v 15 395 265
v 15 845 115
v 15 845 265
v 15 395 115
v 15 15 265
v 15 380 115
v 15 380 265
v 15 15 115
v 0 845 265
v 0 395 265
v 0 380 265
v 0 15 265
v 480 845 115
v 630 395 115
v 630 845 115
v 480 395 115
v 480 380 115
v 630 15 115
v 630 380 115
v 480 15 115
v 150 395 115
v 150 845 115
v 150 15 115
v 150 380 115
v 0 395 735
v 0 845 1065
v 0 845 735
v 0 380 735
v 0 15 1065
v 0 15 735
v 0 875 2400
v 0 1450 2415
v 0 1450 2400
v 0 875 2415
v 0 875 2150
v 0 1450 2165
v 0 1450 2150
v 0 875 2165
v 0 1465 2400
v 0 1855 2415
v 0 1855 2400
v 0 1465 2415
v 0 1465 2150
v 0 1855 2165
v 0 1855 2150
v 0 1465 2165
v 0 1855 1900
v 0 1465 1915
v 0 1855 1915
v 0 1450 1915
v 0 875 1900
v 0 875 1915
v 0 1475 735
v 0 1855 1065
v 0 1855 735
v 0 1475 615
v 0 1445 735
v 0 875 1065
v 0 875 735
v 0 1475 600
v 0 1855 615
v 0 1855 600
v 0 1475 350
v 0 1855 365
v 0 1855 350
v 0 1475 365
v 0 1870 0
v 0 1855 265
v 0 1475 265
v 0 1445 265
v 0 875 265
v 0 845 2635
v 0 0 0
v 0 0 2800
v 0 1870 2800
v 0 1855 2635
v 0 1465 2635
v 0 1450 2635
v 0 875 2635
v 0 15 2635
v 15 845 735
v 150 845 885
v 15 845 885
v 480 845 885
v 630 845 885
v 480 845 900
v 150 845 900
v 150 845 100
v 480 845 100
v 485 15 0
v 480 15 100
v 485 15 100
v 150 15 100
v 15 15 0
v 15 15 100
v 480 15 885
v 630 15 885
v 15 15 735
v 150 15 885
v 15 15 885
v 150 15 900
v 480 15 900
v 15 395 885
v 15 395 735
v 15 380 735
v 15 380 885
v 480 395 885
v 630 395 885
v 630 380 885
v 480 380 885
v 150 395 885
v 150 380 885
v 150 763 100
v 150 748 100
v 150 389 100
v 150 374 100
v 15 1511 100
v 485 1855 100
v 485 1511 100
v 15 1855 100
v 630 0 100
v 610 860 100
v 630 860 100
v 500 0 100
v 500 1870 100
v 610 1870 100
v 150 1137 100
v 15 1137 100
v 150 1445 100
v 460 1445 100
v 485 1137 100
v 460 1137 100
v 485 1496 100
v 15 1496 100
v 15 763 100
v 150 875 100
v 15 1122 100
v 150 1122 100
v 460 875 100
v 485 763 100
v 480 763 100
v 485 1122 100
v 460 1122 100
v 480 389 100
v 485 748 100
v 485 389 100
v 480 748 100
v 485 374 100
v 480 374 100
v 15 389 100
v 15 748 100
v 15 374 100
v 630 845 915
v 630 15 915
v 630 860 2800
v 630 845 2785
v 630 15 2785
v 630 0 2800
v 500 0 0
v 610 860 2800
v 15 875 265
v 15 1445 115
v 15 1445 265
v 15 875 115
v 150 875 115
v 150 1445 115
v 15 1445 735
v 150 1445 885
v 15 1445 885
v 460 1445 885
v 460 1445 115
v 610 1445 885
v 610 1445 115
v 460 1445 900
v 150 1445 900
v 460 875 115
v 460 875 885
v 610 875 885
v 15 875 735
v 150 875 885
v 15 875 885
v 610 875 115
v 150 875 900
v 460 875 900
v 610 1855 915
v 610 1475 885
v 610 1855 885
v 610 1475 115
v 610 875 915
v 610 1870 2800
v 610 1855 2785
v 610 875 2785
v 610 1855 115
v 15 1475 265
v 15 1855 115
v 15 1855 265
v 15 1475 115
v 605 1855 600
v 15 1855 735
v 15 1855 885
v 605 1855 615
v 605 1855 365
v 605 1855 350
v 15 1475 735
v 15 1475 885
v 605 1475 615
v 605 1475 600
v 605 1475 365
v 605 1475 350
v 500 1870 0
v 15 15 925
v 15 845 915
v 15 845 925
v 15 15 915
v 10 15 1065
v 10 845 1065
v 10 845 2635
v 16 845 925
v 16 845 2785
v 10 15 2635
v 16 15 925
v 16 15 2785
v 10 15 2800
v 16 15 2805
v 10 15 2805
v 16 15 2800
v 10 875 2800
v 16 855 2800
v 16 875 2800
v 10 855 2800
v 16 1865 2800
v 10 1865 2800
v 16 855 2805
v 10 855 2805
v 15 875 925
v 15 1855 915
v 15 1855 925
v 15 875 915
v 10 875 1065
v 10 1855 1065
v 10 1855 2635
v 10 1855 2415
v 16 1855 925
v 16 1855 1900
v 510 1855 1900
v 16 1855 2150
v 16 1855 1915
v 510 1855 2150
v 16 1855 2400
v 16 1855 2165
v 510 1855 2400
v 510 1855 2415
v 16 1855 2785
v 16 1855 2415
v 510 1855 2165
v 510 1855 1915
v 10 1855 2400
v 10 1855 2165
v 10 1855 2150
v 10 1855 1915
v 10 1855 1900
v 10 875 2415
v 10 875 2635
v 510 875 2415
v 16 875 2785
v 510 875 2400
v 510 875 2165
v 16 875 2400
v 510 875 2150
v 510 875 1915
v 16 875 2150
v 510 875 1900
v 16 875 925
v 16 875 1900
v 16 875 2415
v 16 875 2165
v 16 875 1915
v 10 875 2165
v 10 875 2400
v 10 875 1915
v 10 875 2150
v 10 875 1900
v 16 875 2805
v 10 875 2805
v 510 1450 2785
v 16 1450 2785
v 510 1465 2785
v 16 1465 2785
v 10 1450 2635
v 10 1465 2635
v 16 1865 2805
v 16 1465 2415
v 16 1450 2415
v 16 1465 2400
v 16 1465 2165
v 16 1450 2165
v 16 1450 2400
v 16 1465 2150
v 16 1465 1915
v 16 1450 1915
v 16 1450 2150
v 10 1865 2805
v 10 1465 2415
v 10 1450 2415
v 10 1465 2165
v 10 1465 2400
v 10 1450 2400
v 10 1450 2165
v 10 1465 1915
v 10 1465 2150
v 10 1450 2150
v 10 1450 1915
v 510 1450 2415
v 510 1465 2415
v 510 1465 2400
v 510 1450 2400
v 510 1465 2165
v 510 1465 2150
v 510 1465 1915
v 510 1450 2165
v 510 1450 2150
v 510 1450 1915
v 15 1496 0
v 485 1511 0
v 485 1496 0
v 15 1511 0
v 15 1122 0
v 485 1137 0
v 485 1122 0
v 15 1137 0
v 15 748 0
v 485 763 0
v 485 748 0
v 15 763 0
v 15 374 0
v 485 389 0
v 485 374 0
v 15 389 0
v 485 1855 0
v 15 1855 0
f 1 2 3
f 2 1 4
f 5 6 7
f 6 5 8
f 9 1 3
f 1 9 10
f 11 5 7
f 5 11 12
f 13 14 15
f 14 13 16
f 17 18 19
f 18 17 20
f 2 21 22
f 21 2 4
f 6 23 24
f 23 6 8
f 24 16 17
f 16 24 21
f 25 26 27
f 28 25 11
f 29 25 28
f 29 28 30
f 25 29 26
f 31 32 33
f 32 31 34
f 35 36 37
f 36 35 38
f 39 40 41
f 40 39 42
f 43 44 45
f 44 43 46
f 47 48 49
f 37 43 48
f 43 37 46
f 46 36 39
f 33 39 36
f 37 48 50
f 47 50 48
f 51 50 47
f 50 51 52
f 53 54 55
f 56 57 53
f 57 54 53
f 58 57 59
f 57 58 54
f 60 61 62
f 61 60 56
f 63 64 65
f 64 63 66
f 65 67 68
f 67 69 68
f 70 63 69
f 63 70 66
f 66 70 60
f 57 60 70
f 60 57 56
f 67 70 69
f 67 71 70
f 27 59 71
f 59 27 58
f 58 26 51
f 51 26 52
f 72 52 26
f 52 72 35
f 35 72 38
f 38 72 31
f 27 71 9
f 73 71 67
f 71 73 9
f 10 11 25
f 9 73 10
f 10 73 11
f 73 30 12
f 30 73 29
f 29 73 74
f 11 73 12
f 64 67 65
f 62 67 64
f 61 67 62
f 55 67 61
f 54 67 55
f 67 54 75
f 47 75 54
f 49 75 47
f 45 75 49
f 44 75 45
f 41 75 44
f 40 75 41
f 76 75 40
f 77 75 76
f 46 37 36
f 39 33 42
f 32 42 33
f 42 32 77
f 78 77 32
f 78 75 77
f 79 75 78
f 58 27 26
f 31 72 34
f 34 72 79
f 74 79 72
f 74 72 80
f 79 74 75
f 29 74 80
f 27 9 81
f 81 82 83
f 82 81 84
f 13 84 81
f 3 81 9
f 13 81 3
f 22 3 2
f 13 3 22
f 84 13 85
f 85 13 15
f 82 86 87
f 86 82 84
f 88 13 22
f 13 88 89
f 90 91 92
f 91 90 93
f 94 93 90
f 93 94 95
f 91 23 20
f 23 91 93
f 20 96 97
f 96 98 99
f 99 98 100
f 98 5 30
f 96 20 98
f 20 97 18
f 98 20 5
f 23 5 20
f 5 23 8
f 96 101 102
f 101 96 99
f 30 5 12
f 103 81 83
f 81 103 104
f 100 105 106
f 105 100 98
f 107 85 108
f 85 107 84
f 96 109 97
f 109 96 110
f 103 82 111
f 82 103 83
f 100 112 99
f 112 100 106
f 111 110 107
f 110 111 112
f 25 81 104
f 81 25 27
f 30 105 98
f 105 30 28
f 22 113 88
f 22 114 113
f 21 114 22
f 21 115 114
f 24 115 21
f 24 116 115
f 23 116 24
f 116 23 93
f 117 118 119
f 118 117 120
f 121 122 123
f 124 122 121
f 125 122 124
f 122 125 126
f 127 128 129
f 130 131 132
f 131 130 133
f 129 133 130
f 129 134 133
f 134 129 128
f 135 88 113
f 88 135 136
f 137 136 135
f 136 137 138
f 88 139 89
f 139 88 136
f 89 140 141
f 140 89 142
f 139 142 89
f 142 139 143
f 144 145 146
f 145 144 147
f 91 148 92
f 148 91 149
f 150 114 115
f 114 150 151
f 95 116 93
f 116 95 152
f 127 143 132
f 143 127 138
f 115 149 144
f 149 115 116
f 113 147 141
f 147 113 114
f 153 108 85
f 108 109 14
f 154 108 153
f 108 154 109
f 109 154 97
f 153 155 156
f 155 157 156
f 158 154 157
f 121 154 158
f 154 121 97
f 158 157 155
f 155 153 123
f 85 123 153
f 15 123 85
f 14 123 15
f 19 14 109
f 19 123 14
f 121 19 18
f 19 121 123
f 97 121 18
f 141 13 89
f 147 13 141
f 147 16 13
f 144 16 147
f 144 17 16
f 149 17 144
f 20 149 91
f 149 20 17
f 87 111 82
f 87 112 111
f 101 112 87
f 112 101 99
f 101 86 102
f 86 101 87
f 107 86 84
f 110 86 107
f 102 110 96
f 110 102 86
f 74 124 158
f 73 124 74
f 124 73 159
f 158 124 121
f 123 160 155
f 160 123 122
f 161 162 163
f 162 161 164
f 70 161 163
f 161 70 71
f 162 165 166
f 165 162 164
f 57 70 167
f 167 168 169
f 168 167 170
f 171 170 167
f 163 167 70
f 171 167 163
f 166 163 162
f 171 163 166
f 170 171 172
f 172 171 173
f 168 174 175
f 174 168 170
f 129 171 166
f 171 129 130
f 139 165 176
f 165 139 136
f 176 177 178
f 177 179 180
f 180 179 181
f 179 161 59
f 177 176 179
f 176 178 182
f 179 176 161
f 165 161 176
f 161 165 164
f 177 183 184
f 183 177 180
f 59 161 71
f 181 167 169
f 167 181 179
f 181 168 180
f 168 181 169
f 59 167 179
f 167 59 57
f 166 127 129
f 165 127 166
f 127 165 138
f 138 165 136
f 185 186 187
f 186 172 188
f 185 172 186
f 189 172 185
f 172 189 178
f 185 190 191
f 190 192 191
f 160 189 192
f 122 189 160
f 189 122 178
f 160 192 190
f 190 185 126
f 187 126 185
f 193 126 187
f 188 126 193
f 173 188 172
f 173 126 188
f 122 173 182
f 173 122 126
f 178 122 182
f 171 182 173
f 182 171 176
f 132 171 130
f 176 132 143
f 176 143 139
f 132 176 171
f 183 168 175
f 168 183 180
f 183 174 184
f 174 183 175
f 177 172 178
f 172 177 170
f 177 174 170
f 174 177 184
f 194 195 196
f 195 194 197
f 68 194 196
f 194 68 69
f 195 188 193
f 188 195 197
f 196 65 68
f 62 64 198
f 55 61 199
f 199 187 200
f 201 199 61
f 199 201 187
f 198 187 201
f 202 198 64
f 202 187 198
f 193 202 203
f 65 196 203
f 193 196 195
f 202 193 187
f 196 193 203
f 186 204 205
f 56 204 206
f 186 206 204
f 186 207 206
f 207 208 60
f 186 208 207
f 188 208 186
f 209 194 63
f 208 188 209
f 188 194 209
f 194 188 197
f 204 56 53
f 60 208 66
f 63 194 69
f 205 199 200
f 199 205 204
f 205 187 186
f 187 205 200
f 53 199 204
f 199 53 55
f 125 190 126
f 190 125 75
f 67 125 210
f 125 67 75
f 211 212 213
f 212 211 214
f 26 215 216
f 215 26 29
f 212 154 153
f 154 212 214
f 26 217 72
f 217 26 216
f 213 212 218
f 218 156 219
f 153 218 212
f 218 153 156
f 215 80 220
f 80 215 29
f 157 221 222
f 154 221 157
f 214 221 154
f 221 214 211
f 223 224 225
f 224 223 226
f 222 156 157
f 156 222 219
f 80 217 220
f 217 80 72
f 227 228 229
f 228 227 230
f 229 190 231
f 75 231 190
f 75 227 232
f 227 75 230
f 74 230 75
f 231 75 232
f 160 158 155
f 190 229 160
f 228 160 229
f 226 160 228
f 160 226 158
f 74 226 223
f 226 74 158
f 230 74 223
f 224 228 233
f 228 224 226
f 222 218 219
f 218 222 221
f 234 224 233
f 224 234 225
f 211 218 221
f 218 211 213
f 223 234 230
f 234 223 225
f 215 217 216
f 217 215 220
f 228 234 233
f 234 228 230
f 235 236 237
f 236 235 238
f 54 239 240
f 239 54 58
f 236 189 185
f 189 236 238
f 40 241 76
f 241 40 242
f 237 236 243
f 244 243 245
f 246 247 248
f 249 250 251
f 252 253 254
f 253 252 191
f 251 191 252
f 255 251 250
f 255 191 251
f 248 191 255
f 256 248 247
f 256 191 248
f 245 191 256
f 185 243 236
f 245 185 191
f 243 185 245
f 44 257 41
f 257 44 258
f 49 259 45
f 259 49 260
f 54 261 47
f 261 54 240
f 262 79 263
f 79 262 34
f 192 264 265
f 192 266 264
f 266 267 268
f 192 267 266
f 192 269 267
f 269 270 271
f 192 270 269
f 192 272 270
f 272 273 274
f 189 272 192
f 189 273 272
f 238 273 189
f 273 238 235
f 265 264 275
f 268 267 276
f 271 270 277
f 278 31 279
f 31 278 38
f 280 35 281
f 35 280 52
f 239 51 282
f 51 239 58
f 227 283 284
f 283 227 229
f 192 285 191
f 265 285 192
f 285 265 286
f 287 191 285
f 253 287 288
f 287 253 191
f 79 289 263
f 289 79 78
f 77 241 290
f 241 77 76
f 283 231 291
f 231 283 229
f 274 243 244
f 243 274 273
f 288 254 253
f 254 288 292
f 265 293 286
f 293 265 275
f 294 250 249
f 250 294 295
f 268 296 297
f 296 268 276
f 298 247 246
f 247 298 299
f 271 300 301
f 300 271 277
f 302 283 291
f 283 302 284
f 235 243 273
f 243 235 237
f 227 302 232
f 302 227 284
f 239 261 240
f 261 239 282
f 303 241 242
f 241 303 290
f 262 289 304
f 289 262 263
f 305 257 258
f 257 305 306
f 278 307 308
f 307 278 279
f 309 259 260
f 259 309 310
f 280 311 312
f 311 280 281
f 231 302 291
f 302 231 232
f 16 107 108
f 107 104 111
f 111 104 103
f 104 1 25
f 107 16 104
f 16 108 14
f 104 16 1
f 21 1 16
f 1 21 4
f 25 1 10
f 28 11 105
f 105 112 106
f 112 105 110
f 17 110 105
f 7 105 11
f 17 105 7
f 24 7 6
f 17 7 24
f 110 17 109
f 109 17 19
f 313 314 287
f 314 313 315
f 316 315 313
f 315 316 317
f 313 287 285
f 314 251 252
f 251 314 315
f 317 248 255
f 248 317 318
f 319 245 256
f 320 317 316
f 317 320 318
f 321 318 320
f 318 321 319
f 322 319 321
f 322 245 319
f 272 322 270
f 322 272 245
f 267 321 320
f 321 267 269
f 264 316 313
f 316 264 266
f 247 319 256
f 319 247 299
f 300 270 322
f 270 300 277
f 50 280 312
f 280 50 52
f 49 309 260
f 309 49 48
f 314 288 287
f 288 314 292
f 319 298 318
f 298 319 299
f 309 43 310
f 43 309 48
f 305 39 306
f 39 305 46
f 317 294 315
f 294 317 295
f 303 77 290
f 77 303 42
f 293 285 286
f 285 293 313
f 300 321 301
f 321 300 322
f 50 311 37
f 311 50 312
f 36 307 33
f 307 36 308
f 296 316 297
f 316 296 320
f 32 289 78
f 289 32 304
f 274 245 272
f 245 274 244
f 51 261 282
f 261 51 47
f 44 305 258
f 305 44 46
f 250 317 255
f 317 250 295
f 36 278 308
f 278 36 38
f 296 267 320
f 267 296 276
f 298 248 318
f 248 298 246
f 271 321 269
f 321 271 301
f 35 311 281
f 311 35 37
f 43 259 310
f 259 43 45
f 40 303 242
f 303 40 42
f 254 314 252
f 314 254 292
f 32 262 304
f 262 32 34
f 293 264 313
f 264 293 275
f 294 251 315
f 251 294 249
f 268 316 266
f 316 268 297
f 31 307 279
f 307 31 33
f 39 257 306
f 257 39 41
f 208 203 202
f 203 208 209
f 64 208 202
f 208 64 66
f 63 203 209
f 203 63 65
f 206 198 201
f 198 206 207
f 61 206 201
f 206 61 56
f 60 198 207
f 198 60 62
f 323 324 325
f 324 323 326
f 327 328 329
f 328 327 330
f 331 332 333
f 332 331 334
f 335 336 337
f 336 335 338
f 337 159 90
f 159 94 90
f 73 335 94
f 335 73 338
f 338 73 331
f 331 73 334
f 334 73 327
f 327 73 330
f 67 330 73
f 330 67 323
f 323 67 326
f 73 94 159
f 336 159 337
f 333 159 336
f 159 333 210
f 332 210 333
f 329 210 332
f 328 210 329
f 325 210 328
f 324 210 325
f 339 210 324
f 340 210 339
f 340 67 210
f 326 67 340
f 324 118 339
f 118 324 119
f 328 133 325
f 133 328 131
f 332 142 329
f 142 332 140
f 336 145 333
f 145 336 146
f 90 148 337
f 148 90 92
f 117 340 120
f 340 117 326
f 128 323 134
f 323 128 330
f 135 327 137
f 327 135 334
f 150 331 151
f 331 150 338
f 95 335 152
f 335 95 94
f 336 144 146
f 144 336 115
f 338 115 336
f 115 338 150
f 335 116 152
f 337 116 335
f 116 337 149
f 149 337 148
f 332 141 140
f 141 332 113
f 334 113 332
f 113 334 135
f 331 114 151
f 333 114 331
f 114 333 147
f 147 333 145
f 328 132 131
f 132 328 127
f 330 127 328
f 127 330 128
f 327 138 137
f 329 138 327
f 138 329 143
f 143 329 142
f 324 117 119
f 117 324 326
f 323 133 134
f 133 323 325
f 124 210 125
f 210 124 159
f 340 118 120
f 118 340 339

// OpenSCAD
use <cajoneriaLibV1.scad>
espesor = 15; riel = 13;
socalo = 100;
// modulo(i) = [
//    ancho, alto, profundidad,
//    refuerzo, esqueleto, fondo, espesor,
//    color, [x,y+sum(modulo(i..i-1)[ancho]),z], nombre
//]
// Modulos anchos sumados 1860
mod_00 = [860,800,630,"No","Si","No",espesor,"White",
         [0,0,socalo], "ModBajo 1"];
mod_01 = [600,800,610,"No","Si","No",espesor,"White",
         [0,mod_00[0],socalo], "ModBajo 2"];
mod_02 = [410,800,610,"No","No","No",espesor,"White",
         [0,mod_00[0]+mod_01[0],socalo], "ModBajo 3"];
         
mod_03 = [860,1900,630,"No","No","Si",espesor,"White",
         [0,0,socalo+mod_00[1]], "ModAlto 1 +10 al fondo"];
mod_04 = [860+150,1900,610,"No","No","Si",espesor,"White",
         [0,mod_03[0],socalo+mod_00[1]], "ModAlto 2 +10 al fondo"];

ModulosX = [mod_00, mod_01, mod_02, mod_03, mod_04, 
];

// puerta = [moduloIndex, ancho, alto, cant, espesor, 
//    color, [x,y,z]], nombre
//]

puerta_00 = [0,mod_02[0]-150,
            mod_02[1]-15,1,
            espesor,"Yellow",
            [mod_02[8][0]+mod_02[2],
                mod_02[8][1]+15,
                mod_02[8][2]+5 ], 
            "Puerta modBajo 2"];
//puerta_01 = [1,mod_01[0]-26-15+(mod_02[0]-150),
//            mod_01[1]-32-30,1,
//            espesor,"Yellow",
//            [mod_01[8][0]+40+mod_01[2],
//                mod_01[8][1]-15,
//                mod_01[8][2]+5], 
//            "puerta 2"];
            
puerta_02 = [0,mod_03[0]-26-15,
            mod_03[1]-32-15,1,
            espesor,"Yellow",
            [mod_03[8][0]-20+mod_03[2],
                mod_03[8][1]+15,
                mod_03[8][2]+5], 
            "puerta corre1"];
puerta_03 = [1,mod_04[0]-26-15-150 ,
            mod_04[1]-32-15,1,
            espesor,"Yellow",
            [mod_04[8][0]-40+mod_04[2],
                mod_04[8][1]-15,
                mod_04[8][2]+20], 
            "puerta corre2"];
             
            
PuertasX = [
        puerta_00, //puerta_01,
        puerta_02, 
        puerta_03
    ];
//div_X = [0,100,1700,
//            1,espesor,"BLUE",
//            [1000, 1000, 0], 
//            "ALTURA DE UNA PERSONA",
//            "lateral"];

div_00 = [0,mod_00[2],mod_00[1]-30,
            1,espesor,"White",
            [mod_00[8][0],
                mod_00[8][1]+380,
                mod_00[8][2]+15], 
            "div vert mod1",
            "lateral"];
div_01 = [0,mod_04[2]-100,mod_04[1]-1030,
            1,espesor,"White",
            [mod_04[8][0],
                mod_04[8][1]+590,
                mod_04[8][2]+1015], 
            "div vert mod2 sup",
            "lateral"];

            
div_02 = [1,mod_04[0]-30-590,
            mod_04[2]-100,1,espesor,"White",
            [mod_04[8][0],
                mod_04[8][1]+15+590,
                mod_04[8][2]+250], 
            "div hori mod2 sup",
            "piso"];
div_03 = [1,mod_04[0]-30-590,
            mod_04[2]-100,1,espesor,"White",
            [mod_04[8][0],
                mod_04[8][1]+15+590,
                mod_04[8][2]+500], 
            "div hori mod2 sup",
            "piso"];
div_04 = [1,mod_04[0]-30-590,
            mod_04[2]-100,1,espesor,"White",
            [mod_04[8][0],
                mod_04[8][1]+15+590,
                mod_04[8][2]+750], 
            "div hori mod2 sup",
            "piso"];
div_05 = [1,mod_04[0]-30,mod_04[2]-100,1,espesor,"White",
            [mod_04[8][0],
                mod_04[8][1]+15,
                mod_04[8][2]+1000], 
            "div hori mod2 sup",
            "piso"];
div_06 = [1,mod_04[0]-30,mod_04[2]-100,1,espesor,"White",
            [mod_04[8][0],
                mod_04[8][1]+15,
                mod_04[8][2]+1250], 
            "div hori mod2 sup",
            "piso"];
div_07 = [1,mod_04[0]-30,mod_04[2]-100,1,espesor,"White",
            [mod_04[8][0],
                mod_04[8][1]+15,
                mod_04[8][2]+1500], 
            "div hori mod2 sup",
            "piso"];

Divisiones = [ //div_X,
            div_00, 
            div_01,
            //div_02,div_03,div_04, 
            div_05,div_06,div_07
];

div_13 = [0,mod_02[0]-10,mod_02[2]-5,1,espesor,"White",
            [mod_02[8][0],
                mod_02[8][1]+5,
                mod_02[8][2]+250], 
            "div hori mod3 bajo",
            "piso"];
div_14 = [0,mod_02[0]-10,mod_02[2]-5,1,espesor,"White",
            [mod_02[8][0],
                mod_02[8][1]+5,
                mod_02[8][2]+500], 
            "div hori mod3 bajo",
            "piso"];

Divisiones_01 = [
            div_13, div_14,
];


//armario_00 = [moduloIndex, ancho, alto, profundidad,
//            espesor, color, divisiones, [x,y,z]];

armario_00 = [2, mod_00[0]-espesor*2, 500, mod_02[2]-espesor-6,
            espesor, "White", (1+1),
            [mod_00[8][0]+espesor*2,
                mod_00[8][1]+espesor,
                mod_00[8][2]+150],
            "Armario 1"];

socalo_00 = [0, 500, 1870, socalo,
            espesor, "White", (4+2),
            [0,0,0],
            "Socalo 1"];

// cajon_00 = [moduloIndex, ancho, alto, profundidad,
//          espesor, color, frenteDec, anchoDec, altoDec, 
//          colorDec, [x,y,z]]


cajon_00 = [1, mod_01[0]-espesor*2-riel*2, 200, mod_01[2]-50,
          espesor, "White", "Si", mod_01[0]-espesor*2, 
          250,"Yellow", 
          [mod_01[8][0]+50,
            mod_01[8][1]+espesor+riel,
            mod_01[8][2]+espesor]];
cajon_01 = [1, mod_01[0]-espesor*2-riel*2, 
            200, mod_01[2]-50,
          espesor, "White", "Si", 
          mod_01[0]-espesor*2, 
          250,"Yellow", 
          [mod_01[8][0]+50,
            mod_01[8][1]+espesor+riel,
            mod_01[8][2]+espesor+260+3]];
cajon_02 = [1, mod_01[0]-espesor*2-riel*2, 200, mod_01[2]-50,
          espesor, "White", "Si", mod_01[0]-espesor*2, 
          250,"Yellow", 
          [mod_01[8][0]+50,
            mod_01[8][1]+espesor+riel,
            mod_01[8][2]+espesor+(260+3)*2]];
cajon_03 = [1, mod_01[0]-espesor*2-riel*2, 120, mod_01[2]-50,
          espesor, "White", "Si", mod_01[0]-espesor*2, 
          150,"Yellow", 
          [mod_01[8][0]+50,
            mod_01[8][1]+espesor+riel,
            mod_01[8][2]+espesor+(260+3)*3]];            


CajonesX = [
    cajon_00, cajon_01, cajon_02, //cajon_03
];

cajon_10 = [1, mod_00[0]-espesor*2-riel*2-380, 200, mod_00[2]-50,
          espesor, "White", "Si", mod_00[0]-espesor*2-380, 
          250,"Yellow", 
          [mod_00[8][0]+50,
            mod_00[8][1]+espesor+riel+380,
            mod_00[8][2]+espesor]];
cajon_11 = [1, mod_00[0]-espesor*2-riel*2-380, 200, mod_00[2]-50,
          espesor, "White", "Si", mod_00[0]-espesor*2-380, 
          250,"Yellow", 
          [mod_00[8][0]+50,
            mod_00[8][1]+espesor+riel+380,
            mod_00[8][2]+espesor+260+3]];
cajon_12 = [1, mod_00[0]-espesor*2-riel*2-380, 200, mod_00[2]-50,
          espesor, "White", "Si", mod_00[0]-espesor*2-380, 
          250,"Yellow", 
          [mod_00[8][0]+50,
            mod_00[8][1]+espesor+riel+380,
            mod_00[8][2]+espesor+(260+3)*2]];
cajon_13 = [1, mod_00[0]-espesor*2-riel*2-380, 130, mod_00[2]-50,
          espesor, "White", "Si", mod_00[0]-espesor*2-380, 
          150,"Yellow", 
          [mod_00[8][0]+50,
            mod_00[8][1]+espesor+riel+380,
            mod_00[8][2]+espesor+(260+3)*3]];

CajonesX_01 = [
    cajon_10, cajon_11, cajon_12, 
    //cajon_13,
];

//CajonY = [anchoCajon=400, altoCajon=800, 
//            profundoCajon=500, 
//            espesor=15, color="green",
//            frente="Si",
//            altoFrente=815, anchoPlus=520,
//            colorFrente= "red"];

CajonY_01 = [380-13-15, 750, 550, 
            15, "White",
            "Si",
            770, 380,
            "Yellow"];

modulosdeCocina(ModulosX);
//puertasdeModulo(PuertasX);
divisiones(Divisiones); 
divisiones(Divisiones_01); 
socalo(socalo_00);
//cajonesdeModulo(CajonesX);
//cajonesdeModulo(CajonesX_01);

//translate([50+30,13,socalo+20])
//cajonY(CajonY_01[0],CajonY_01[1],CajonY_01[2],
//        CajonY_01[3],CajonY_01[4],CajonY_01[5],
//        CajonY_01[6],CajonY_01[7],CajonY_01[8]
//        );
//        
